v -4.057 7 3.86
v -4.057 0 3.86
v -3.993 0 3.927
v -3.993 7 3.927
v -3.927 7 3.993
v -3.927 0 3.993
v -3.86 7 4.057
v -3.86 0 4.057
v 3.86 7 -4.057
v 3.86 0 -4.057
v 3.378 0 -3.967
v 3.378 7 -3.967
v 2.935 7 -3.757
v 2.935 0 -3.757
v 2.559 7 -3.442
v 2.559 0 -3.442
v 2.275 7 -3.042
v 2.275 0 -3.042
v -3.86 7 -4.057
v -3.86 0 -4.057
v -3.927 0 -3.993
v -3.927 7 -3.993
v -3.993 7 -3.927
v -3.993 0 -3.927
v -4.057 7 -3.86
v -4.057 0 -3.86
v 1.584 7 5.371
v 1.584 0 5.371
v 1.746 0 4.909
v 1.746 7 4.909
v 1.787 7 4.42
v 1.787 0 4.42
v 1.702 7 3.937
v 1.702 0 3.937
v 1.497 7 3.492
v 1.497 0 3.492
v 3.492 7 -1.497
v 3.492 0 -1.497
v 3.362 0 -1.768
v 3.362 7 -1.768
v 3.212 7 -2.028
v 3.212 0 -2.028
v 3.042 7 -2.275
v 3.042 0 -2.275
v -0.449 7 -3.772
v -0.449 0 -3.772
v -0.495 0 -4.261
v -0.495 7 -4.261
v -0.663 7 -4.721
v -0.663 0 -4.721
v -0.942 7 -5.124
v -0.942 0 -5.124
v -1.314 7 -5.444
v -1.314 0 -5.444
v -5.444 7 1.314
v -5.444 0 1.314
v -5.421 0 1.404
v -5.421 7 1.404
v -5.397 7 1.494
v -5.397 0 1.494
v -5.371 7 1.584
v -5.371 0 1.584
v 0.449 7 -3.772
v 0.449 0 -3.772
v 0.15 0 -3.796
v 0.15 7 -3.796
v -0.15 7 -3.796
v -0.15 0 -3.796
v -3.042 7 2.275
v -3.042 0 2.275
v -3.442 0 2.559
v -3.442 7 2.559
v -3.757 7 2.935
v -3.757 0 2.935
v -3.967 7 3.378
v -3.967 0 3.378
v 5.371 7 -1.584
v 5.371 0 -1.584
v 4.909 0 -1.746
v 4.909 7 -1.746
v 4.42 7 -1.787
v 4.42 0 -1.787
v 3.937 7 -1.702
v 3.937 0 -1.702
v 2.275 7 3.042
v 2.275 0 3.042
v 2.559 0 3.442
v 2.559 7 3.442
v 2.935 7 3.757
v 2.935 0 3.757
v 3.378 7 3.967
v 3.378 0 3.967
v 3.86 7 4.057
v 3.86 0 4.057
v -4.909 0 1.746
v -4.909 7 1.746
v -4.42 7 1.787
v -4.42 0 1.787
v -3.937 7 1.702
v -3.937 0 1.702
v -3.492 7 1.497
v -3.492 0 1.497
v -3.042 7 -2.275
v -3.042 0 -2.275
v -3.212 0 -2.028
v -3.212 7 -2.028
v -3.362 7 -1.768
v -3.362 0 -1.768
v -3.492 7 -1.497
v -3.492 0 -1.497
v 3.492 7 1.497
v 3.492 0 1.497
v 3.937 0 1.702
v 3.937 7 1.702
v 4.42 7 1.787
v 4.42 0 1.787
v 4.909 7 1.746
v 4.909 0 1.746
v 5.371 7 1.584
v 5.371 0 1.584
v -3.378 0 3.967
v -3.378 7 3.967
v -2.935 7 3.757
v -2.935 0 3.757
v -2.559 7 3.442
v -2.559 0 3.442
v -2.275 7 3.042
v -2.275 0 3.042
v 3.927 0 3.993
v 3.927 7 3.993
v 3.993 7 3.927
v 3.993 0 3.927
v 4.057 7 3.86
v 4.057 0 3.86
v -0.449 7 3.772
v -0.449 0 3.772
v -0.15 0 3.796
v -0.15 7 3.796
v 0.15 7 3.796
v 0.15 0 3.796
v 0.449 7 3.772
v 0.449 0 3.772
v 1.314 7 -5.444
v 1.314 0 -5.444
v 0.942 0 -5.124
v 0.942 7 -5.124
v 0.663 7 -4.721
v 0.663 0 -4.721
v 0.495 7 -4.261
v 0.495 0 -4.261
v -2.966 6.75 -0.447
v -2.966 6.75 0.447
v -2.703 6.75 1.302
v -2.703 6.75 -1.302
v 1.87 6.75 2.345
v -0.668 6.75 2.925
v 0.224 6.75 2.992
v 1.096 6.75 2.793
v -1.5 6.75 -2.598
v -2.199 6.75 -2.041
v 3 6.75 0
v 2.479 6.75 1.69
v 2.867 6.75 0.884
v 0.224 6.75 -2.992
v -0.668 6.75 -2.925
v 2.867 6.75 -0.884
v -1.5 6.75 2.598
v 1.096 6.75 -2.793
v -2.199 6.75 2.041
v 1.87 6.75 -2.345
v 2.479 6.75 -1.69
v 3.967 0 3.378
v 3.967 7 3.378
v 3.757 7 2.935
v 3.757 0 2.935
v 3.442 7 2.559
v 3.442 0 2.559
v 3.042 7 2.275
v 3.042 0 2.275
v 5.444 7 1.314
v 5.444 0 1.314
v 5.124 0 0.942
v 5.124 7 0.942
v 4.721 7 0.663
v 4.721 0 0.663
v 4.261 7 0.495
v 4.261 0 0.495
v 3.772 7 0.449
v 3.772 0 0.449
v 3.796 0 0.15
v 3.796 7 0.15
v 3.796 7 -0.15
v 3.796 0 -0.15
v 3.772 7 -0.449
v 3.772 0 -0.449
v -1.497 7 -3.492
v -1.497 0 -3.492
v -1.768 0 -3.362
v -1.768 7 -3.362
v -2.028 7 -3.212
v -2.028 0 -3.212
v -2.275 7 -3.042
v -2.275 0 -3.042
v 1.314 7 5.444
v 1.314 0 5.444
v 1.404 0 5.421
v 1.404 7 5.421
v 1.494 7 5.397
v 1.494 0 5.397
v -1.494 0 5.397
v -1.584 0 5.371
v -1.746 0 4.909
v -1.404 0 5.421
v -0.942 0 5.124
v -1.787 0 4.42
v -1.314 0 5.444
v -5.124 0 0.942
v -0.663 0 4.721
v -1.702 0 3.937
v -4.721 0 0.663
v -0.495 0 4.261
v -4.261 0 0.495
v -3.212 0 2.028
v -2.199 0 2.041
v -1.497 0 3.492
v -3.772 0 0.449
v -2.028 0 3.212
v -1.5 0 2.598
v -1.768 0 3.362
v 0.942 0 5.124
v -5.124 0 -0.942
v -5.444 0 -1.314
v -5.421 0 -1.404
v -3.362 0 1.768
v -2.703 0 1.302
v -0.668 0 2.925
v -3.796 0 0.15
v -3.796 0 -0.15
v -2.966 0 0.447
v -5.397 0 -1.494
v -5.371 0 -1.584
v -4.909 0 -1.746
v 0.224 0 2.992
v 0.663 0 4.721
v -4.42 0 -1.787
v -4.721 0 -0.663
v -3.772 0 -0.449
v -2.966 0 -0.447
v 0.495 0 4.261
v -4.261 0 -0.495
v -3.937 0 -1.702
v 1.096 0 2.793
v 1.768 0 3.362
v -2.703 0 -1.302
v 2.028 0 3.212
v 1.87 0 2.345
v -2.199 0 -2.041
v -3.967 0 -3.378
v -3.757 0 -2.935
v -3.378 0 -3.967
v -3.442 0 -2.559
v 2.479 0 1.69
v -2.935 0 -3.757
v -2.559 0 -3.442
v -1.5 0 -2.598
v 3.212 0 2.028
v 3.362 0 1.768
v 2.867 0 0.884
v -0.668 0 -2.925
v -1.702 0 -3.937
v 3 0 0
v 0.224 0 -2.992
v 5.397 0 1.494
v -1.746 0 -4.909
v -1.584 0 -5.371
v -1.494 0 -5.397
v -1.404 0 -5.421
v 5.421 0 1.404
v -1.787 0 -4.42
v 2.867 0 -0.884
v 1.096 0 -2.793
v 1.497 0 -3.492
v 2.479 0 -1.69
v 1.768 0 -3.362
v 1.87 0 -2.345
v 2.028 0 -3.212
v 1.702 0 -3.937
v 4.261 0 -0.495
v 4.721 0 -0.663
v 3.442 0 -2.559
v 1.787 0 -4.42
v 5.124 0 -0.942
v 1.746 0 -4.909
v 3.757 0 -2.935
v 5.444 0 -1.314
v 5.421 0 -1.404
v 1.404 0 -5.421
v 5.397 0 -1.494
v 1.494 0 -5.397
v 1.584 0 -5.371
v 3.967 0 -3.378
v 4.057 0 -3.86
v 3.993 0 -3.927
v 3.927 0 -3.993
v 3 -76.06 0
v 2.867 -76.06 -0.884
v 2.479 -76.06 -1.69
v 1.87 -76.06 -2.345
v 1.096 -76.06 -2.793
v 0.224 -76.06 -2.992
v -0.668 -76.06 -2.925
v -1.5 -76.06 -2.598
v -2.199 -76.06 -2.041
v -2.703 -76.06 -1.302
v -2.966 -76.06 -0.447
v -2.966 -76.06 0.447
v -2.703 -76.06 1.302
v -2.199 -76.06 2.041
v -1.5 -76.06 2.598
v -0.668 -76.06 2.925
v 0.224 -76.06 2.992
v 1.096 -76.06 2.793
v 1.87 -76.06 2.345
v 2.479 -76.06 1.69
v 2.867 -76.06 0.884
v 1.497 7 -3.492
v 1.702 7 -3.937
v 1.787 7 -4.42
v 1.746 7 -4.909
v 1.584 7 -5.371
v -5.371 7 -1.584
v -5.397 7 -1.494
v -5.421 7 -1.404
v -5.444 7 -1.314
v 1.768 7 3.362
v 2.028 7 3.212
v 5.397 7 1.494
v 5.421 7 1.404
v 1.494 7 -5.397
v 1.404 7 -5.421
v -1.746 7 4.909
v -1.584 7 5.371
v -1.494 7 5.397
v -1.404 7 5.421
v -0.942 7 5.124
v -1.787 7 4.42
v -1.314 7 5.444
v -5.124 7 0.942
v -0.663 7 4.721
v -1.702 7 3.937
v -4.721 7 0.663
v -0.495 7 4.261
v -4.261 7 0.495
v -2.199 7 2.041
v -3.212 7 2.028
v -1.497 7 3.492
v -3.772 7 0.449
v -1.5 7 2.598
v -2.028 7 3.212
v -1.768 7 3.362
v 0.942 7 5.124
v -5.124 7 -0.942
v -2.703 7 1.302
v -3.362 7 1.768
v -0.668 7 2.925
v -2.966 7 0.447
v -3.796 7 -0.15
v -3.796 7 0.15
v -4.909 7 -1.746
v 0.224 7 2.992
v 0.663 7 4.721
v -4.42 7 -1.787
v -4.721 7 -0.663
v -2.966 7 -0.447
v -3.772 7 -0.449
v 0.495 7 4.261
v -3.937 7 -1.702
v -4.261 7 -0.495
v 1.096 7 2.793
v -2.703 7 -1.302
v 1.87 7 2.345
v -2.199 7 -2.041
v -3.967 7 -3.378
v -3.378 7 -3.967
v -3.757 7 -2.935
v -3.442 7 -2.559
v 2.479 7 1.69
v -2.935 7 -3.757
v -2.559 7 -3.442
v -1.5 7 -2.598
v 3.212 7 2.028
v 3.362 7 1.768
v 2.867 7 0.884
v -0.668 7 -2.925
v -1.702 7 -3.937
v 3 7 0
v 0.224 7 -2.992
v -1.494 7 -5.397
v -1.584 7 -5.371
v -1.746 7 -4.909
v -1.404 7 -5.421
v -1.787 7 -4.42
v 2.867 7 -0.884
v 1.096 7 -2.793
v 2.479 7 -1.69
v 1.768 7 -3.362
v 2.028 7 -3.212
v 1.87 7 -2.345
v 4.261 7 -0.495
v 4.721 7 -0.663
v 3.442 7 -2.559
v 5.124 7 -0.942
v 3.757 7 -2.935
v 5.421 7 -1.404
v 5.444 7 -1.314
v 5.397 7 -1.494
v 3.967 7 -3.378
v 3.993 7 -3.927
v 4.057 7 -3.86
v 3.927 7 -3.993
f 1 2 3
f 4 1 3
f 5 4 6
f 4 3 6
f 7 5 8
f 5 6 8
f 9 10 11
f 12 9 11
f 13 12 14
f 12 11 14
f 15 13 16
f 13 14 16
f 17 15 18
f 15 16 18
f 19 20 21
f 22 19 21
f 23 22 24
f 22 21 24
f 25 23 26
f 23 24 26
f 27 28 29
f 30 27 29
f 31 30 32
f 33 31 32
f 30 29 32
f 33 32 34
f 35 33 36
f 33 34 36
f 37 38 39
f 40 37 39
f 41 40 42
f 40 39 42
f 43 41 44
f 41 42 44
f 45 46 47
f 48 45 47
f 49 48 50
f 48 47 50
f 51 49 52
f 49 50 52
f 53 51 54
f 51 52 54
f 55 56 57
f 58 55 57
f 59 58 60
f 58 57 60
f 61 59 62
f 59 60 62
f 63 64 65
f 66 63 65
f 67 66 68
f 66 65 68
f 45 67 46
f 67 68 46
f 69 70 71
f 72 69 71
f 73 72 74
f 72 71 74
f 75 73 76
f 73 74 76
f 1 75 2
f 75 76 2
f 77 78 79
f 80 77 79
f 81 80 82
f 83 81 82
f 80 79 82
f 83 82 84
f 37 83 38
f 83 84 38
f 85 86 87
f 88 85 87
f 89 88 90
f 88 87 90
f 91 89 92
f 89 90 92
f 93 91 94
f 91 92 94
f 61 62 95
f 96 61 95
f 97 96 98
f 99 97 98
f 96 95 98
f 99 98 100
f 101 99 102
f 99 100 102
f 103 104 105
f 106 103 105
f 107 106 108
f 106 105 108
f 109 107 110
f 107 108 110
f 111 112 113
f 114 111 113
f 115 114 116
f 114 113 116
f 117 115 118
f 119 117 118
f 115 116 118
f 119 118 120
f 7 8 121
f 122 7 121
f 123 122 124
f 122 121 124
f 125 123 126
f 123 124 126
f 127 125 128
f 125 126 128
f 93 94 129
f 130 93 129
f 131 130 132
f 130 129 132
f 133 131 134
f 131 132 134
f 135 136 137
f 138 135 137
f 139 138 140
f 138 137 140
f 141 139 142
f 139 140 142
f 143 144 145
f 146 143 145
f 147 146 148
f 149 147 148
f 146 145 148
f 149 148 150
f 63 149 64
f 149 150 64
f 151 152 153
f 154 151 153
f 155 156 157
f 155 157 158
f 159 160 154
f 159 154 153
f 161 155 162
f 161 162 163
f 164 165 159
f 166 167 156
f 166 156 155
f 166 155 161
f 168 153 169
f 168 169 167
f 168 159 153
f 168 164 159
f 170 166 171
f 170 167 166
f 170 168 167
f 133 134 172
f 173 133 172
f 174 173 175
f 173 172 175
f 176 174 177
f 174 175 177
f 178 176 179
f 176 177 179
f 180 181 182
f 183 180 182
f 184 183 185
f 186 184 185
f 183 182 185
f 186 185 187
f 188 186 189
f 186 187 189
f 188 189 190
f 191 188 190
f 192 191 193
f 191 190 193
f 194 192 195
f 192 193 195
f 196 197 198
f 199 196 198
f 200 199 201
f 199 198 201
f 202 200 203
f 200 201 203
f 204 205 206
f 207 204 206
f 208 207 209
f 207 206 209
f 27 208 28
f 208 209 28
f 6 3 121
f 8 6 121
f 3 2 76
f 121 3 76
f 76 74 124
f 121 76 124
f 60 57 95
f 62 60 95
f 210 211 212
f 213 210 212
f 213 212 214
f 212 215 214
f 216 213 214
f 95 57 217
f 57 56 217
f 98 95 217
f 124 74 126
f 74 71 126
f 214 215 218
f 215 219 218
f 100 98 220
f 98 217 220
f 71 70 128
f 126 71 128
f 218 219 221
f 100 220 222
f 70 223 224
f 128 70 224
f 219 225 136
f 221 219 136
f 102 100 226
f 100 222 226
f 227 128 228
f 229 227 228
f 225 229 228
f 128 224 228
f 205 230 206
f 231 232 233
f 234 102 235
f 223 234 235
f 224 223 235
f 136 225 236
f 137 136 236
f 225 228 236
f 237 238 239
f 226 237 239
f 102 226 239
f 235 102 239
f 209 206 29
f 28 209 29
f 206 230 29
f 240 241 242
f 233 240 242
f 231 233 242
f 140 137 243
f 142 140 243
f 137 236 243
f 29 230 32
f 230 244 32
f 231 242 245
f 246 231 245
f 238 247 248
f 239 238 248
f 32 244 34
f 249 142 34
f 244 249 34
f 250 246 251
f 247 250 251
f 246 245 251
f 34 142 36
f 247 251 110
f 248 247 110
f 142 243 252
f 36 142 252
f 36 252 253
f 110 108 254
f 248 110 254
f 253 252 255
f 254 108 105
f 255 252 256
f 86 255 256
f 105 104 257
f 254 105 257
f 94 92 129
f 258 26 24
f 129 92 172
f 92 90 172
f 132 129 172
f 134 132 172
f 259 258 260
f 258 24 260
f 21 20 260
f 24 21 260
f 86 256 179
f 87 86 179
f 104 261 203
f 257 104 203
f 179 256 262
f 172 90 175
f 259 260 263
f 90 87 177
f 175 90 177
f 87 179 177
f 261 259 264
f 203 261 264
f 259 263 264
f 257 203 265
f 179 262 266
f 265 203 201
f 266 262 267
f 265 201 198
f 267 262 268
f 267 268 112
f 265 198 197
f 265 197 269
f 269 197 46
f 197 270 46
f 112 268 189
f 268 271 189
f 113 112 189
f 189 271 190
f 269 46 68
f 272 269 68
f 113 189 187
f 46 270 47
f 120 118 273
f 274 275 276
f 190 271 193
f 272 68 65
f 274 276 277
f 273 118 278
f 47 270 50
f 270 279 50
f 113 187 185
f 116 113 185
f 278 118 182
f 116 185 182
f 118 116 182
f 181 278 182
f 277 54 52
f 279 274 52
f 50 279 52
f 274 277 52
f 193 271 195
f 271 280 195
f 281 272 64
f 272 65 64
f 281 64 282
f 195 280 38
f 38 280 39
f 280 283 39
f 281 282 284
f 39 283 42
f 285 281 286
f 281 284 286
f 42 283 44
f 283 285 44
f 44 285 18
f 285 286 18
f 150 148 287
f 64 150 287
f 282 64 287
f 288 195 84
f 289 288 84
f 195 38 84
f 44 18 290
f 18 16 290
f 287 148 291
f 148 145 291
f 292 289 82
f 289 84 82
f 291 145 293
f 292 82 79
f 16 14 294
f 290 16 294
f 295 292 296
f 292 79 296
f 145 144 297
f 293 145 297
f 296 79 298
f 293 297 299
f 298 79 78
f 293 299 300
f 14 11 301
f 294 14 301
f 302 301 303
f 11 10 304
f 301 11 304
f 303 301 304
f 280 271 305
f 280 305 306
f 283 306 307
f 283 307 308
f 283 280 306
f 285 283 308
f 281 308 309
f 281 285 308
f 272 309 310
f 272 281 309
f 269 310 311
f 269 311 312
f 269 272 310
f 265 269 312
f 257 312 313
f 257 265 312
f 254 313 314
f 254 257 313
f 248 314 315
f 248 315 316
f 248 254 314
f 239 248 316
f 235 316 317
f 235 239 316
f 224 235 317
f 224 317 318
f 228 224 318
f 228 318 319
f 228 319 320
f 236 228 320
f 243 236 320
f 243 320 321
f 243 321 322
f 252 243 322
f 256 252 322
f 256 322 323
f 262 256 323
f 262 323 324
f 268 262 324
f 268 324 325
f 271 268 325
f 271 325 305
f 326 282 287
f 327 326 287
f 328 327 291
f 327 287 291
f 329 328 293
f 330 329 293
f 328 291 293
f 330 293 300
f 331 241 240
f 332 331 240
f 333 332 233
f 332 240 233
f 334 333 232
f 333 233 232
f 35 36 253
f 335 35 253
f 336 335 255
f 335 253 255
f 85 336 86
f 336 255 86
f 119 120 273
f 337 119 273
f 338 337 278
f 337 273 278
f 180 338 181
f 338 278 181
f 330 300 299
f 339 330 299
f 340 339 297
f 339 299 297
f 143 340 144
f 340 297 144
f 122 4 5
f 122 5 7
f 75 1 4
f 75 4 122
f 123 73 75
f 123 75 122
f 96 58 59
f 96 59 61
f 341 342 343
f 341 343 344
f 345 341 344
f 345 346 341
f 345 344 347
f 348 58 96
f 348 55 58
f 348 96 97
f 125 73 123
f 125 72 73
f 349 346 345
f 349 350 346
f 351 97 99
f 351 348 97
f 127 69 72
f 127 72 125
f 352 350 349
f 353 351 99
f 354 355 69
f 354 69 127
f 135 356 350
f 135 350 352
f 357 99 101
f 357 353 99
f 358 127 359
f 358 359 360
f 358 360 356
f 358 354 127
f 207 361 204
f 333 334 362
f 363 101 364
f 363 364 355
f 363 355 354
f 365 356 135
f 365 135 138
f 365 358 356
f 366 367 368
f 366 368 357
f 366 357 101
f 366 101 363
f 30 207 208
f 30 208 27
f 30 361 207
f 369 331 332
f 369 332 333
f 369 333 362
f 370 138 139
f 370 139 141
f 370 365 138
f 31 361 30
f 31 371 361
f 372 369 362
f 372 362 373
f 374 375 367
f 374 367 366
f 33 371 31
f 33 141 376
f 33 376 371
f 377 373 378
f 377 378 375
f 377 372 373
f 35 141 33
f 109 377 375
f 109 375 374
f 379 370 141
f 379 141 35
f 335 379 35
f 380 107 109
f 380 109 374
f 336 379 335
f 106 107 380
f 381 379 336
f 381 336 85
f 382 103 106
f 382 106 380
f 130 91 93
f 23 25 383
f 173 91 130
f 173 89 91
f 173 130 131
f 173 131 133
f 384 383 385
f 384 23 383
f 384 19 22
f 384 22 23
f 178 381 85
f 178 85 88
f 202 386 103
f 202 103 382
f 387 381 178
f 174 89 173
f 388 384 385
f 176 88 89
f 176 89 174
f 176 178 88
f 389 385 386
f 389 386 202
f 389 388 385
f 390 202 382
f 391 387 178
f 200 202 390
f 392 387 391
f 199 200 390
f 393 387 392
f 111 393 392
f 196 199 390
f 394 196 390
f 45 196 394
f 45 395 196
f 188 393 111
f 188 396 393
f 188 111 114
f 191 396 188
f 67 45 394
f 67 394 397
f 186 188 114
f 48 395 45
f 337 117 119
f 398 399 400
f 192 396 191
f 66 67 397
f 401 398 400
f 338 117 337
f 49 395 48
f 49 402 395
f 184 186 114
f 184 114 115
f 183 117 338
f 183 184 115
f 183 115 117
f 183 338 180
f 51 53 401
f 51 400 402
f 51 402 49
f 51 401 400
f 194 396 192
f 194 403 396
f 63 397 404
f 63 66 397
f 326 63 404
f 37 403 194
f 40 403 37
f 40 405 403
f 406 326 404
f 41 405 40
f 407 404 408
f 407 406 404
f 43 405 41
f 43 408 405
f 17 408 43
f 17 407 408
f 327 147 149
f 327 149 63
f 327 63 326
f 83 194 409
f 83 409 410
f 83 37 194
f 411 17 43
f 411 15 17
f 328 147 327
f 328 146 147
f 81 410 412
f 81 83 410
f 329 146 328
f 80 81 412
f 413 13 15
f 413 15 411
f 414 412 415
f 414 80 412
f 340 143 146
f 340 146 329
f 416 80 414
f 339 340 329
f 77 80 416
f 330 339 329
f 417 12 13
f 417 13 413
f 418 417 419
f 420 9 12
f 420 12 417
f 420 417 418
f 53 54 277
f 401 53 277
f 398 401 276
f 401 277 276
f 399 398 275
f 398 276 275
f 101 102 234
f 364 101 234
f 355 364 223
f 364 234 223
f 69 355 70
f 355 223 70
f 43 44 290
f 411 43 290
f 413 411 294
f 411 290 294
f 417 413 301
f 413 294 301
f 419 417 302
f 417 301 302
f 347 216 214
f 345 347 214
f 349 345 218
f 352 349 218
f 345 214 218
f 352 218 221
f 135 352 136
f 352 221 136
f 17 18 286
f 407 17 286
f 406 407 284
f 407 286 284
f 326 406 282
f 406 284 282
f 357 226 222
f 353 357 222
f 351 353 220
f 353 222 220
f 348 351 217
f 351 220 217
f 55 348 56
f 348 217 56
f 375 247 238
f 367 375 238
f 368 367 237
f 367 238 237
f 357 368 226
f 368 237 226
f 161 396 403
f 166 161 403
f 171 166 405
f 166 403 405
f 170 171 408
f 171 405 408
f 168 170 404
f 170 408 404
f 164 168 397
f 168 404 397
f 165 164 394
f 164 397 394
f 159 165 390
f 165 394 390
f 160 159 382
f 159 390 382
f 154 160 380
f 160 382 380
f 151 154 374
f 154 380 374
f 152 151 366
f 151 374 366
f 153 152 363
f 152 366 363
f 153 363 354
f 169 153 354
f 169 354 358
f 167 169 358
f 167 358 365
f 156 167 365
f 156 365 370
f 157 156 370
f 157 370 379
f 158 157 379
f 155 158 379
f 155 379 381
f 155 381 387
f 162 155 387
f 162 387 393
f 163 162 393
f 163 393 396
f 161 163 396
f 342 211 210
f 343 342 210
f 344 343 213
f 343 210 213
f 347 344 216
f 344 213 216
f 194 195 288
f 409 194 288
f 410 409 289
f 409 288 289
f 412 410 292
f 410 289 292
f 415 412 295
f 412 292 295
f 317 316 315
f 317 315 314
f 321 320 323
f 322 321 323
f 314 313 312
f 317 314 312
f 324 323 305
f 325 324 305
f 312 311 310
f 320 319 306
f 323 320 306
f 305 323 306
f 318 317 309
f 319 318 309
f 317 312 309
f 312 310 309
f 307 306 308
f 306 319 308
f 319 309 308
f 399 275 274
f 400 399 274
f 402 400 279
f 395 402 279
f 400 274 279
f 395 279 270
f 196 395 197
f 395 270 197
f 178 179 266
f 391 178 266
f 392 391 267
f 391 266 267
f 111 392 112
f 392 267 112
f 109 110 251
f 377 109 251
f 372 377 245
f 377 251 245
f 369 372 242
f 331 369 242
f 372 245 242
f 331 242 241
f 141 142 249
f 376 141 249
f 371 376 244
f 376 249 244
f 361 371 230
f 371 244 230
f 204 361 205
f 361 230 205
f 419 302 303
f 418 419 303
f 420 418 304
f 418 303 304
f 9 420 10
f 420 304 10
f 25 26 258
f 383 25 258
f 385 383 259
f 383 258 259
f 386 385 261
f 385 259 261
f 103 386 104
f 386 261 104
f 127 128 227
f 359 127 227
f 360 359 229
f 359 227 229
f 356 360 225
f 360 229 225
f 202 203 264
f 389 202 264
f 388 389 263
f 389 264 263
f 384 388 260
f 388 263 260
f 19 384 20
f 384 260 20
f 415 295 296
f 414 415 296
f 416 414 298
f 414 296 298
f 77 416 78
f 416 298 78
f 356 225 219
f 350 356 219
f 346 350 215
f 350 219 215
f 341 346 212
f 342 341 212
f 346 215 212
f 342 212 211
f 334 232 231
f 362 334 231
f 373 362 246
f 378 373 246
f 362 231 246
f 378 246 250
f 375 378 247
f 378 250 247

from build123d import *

# Parameters (mm, degrees)
BOSS_EXTRUDE1_DEPTH = 7
SKETCH2_R           = 3
CUT_EXTRUDE1_DEPTH  = 7
BOSS_EXTRUDE2_START = -0.25
SKETCH2_2_R         = 3
BOSS_EXTRUDE2_DEPTH = 82.81


with BuildPart() as part:
    # Sketch1 → Boss-Extrude1 (new body)
    with BuildSketch(Plane(origin=(0, 0, 0), x_dir=(1, 0, 0), z_dir=(0, 1, 0))):
        with BuildLine():
            ThreePointArc((-4.057364733, 3.859765721), (-3.757286187, 2.934610179), (-3.042339168, 2.275208427))
            ThreePointArc((-3.042339168, 2.275208427), (-3.290030509, 1.8995), (-3.491557881, 1.497138792))
            ThreePointArc((-3.491557881, 1.497138792), (-4.420090059, 1.786600197), (-5.371337534, 1.583898071))
            ThreePointArc((-5.371337534, 1.583898071), (-5.409184627, 1.449386653), (-5.443663792, 1.313972801))
            ThreePointArc((-5.443663792, 1.313972801), (-4.721210377, 0.662803872), (-3.77234722, 0.449218713))
            ThreePointArc((-3.77234722, 0.449218713), (-3.799, 0), (-3.77234722, -0.449218713))
            ThreePointArc((-3.77234722, -0.449218713), (-4.721210377, -0.662803872), (-5.443663792, -1.313972801))
            ThreePointArc((-5.443663792, -1.313972801), (-5.409184627, -1.449386653), (-5.371337534, -1.583898071))
            ThreePointArc((-5.371337534, -1.583898071), (-4.420090059, -1.786600197), (-3.491557881, -1.497138792))
            ThreePointArc((-3.491557881, -1.497138792), (-3.290030509, -1.8995), (-3.042339168, -2.275208427))
            ThreePointArc((-3.042339168, -2.275208427), (-3.757286187, -2.934610179), (-4.057364733, -3.859765721))
            ThreePointArc((-4.057364733, -3.859765721), (-3.959797975, -3.959797975), (-3.859765721, -4.057364733))
            ThreePointArc((-3.859765721, -4.057364733), (-2.934610179, -3.757286187), (-2.275208427, -3.042339168))
            ThreePointArc((-2.275208427, -3.042339168), (-1.8995, -3.290030509), (-1.497138792, -3.491557881))
            ThreePointArc((-1.497138792, -3.491557881), (-1.786600197, -4.420090059), (-1.583898071, -5.371337534))
            ThreePointArc((-1.583898071, -5.371337534), (-1.449386653, -5.409184627), (-1.313972801, -5.443663792))
            ThreePointArc((-1.313972801, -5.443663792), (-0.662803872, -4.721210377), (-0.449218713, -3.77234722))
            ThreePointArc((-0.449218713, -3.77234722), (0, -3.799), (0.449218713, -3.77234722))
            ThreePointArc((0.449218713, -3.77234722), (0.662803872, -4.721210377), (1.313972801, -5.443663792))
            ThreePointArc((1.313972801, -5.443663792), (1.449386653, -5.409184627), (1.583898071, -5.371337534))
            ThreePointArc((1.583898071, -5.371337534), (1.786600197, -4.420090059), (1.497138792, -3.491557881))
            ThreePointArc((1.497138792, -3.491557881), (1.8995, -3.290030509), (2.275208427, -3.042339168))
            ThreePointArc((2.275208427, -3.042339168), (2.934610179, -3.757286187), (3.859765721, -4.057364733))
            ThreePointArc((3.859765721, -4.057364733), (3.959797975, -3.959797975), (4.057364733, -3.859765721))
            ThreePointArc((4.057364733, -3.859765721), (3.757286187, -2.934610179), (3.042339168, -2.275208427))
            ThreePointArc((3.042339168, -2.275208427), (3.290030509, -1.8995), (3.491557881, -1.497138792))
            ThreePointArc((3.491557881, -1.497138792), (4.420090059, -1.786600197), (5.371337534, -1.583898071))
            ThreePointArc((5.371337534, -1.583898071), (5.409184627, -1.449386653), (5.443663792, -1.313972801))
            ThreePointArc((5.443663792, -1.313972801), (4.721210377, -0.662803872), (3.77234722, -0.449218713))
            ThreePointArc((3.77234722, -0.449218713), (3.799, 0), (3.77234722, 0.449218713))
            ThreePointArc((3.77234722, 0.449218713), (4.721210377, 0.662803872), (5.443663792, 1.313972801))
            ThreePointArc((5.443663792, 1.313972801), (5.409184627, 1.449386653), (5.371337534, 1.583898071))
            ThreePointArc((5.371337534, 1.583898071), (4.420090059, 1.786600197), (3.491557881, 1.497138792))
            ThreePointArc((3.491557881, 1.497138792), (3.290030509, 1.8995), (3.042339168, 2.275208427))
            ThreePointArc((3.042339168, 2.275208427), (3.757286187, 2.934610179), (4.057364733, 3.859765721))
            ThreePointArc((4.057364733, 3.859765721), (3.959797975, 3.959797975), (3.859765721, 4.057364733))
            ThreePointArc((3.859765721, 4.057364733), (2.934610179, 3.757286187), (2.275208427, 3.042339168))
            ThreePointArc((2.275208427, 3.042339168), (1.8995, 3.290030509), (1.497138792, 3.491557881))
            ThreePointArc((1.497138792, 3.491557881), (1.786600197, 4.420090059), (1.583898071, 5.371337534))
            ThreePointArc((1.583898071, 5.371337534), (1.449386653, 5.409184627), (1.313972801, 5.443663792))
            ThreePointArc((1.313972801, 5.443663792), (0.662803872, 4.721210377), (0.449218713, 3.77234722))
            ThreePointArc((0.449218713, 3.77234722), (0, 3.799), (-0.449218713, 3.77234722))
            ThreePointArc((-0.449218713, 3.77234722), (-0.662803872, 4.721210377), (-1.313972801, 5.443663792))
            ThreePointArc((-1.313972801, 5.443663792), (-1.449386653, 5.409184627), (-1.583898071, 5.371337534))
            ThreePointArc((-1.583898071, 5.371337534), (-1.786600197, 4.420090059), (-1.497138792, 3.491557881))
            ThreePointArc((-1.497138792, 3.491557881), (-1.8995, 3.290030509), (-2.275208427, 3.042339168))
            ThreePointArc((-2.275208427, 3.042339168), (-2.934610179, 3.757286187), (-3.859765721, 4.057364733))
            ThreePointArc((-3.859765721, 4.057364733), (-3.959797975, 3.959797975), (-4.057364733, 3.859765721))
        make_face()
    extrude(amount=BOSS_EXTRUDE1_DEPTH)

    # Sketch2 → Cut-Extrude1 (cut)
    with BuildSketch(Plane(origin=(0, 7, 0), x_dir=(1, 0, 0), z_dir=(0, 1, 0))):
        Circle(SKETCH2_R)
    extrude(amount=-CUT_EXTRUDE1_DEPTH, mode=Mode.SUBTRACT)

    # Sketch2<2> → Boss-Extrude2 (add)
    with BuildSketch(Plane(origin=(0, 7, 0), x_dir=(1, 0, 0), z_dir=(0, 1, 0)).offset(BOSS_EXTRUDE2_START)):
        Circle(SKETCH2_2_R)
    extrude(amount=-BOSS_EXTRUDE2_DEPTH)


solid = part.part
